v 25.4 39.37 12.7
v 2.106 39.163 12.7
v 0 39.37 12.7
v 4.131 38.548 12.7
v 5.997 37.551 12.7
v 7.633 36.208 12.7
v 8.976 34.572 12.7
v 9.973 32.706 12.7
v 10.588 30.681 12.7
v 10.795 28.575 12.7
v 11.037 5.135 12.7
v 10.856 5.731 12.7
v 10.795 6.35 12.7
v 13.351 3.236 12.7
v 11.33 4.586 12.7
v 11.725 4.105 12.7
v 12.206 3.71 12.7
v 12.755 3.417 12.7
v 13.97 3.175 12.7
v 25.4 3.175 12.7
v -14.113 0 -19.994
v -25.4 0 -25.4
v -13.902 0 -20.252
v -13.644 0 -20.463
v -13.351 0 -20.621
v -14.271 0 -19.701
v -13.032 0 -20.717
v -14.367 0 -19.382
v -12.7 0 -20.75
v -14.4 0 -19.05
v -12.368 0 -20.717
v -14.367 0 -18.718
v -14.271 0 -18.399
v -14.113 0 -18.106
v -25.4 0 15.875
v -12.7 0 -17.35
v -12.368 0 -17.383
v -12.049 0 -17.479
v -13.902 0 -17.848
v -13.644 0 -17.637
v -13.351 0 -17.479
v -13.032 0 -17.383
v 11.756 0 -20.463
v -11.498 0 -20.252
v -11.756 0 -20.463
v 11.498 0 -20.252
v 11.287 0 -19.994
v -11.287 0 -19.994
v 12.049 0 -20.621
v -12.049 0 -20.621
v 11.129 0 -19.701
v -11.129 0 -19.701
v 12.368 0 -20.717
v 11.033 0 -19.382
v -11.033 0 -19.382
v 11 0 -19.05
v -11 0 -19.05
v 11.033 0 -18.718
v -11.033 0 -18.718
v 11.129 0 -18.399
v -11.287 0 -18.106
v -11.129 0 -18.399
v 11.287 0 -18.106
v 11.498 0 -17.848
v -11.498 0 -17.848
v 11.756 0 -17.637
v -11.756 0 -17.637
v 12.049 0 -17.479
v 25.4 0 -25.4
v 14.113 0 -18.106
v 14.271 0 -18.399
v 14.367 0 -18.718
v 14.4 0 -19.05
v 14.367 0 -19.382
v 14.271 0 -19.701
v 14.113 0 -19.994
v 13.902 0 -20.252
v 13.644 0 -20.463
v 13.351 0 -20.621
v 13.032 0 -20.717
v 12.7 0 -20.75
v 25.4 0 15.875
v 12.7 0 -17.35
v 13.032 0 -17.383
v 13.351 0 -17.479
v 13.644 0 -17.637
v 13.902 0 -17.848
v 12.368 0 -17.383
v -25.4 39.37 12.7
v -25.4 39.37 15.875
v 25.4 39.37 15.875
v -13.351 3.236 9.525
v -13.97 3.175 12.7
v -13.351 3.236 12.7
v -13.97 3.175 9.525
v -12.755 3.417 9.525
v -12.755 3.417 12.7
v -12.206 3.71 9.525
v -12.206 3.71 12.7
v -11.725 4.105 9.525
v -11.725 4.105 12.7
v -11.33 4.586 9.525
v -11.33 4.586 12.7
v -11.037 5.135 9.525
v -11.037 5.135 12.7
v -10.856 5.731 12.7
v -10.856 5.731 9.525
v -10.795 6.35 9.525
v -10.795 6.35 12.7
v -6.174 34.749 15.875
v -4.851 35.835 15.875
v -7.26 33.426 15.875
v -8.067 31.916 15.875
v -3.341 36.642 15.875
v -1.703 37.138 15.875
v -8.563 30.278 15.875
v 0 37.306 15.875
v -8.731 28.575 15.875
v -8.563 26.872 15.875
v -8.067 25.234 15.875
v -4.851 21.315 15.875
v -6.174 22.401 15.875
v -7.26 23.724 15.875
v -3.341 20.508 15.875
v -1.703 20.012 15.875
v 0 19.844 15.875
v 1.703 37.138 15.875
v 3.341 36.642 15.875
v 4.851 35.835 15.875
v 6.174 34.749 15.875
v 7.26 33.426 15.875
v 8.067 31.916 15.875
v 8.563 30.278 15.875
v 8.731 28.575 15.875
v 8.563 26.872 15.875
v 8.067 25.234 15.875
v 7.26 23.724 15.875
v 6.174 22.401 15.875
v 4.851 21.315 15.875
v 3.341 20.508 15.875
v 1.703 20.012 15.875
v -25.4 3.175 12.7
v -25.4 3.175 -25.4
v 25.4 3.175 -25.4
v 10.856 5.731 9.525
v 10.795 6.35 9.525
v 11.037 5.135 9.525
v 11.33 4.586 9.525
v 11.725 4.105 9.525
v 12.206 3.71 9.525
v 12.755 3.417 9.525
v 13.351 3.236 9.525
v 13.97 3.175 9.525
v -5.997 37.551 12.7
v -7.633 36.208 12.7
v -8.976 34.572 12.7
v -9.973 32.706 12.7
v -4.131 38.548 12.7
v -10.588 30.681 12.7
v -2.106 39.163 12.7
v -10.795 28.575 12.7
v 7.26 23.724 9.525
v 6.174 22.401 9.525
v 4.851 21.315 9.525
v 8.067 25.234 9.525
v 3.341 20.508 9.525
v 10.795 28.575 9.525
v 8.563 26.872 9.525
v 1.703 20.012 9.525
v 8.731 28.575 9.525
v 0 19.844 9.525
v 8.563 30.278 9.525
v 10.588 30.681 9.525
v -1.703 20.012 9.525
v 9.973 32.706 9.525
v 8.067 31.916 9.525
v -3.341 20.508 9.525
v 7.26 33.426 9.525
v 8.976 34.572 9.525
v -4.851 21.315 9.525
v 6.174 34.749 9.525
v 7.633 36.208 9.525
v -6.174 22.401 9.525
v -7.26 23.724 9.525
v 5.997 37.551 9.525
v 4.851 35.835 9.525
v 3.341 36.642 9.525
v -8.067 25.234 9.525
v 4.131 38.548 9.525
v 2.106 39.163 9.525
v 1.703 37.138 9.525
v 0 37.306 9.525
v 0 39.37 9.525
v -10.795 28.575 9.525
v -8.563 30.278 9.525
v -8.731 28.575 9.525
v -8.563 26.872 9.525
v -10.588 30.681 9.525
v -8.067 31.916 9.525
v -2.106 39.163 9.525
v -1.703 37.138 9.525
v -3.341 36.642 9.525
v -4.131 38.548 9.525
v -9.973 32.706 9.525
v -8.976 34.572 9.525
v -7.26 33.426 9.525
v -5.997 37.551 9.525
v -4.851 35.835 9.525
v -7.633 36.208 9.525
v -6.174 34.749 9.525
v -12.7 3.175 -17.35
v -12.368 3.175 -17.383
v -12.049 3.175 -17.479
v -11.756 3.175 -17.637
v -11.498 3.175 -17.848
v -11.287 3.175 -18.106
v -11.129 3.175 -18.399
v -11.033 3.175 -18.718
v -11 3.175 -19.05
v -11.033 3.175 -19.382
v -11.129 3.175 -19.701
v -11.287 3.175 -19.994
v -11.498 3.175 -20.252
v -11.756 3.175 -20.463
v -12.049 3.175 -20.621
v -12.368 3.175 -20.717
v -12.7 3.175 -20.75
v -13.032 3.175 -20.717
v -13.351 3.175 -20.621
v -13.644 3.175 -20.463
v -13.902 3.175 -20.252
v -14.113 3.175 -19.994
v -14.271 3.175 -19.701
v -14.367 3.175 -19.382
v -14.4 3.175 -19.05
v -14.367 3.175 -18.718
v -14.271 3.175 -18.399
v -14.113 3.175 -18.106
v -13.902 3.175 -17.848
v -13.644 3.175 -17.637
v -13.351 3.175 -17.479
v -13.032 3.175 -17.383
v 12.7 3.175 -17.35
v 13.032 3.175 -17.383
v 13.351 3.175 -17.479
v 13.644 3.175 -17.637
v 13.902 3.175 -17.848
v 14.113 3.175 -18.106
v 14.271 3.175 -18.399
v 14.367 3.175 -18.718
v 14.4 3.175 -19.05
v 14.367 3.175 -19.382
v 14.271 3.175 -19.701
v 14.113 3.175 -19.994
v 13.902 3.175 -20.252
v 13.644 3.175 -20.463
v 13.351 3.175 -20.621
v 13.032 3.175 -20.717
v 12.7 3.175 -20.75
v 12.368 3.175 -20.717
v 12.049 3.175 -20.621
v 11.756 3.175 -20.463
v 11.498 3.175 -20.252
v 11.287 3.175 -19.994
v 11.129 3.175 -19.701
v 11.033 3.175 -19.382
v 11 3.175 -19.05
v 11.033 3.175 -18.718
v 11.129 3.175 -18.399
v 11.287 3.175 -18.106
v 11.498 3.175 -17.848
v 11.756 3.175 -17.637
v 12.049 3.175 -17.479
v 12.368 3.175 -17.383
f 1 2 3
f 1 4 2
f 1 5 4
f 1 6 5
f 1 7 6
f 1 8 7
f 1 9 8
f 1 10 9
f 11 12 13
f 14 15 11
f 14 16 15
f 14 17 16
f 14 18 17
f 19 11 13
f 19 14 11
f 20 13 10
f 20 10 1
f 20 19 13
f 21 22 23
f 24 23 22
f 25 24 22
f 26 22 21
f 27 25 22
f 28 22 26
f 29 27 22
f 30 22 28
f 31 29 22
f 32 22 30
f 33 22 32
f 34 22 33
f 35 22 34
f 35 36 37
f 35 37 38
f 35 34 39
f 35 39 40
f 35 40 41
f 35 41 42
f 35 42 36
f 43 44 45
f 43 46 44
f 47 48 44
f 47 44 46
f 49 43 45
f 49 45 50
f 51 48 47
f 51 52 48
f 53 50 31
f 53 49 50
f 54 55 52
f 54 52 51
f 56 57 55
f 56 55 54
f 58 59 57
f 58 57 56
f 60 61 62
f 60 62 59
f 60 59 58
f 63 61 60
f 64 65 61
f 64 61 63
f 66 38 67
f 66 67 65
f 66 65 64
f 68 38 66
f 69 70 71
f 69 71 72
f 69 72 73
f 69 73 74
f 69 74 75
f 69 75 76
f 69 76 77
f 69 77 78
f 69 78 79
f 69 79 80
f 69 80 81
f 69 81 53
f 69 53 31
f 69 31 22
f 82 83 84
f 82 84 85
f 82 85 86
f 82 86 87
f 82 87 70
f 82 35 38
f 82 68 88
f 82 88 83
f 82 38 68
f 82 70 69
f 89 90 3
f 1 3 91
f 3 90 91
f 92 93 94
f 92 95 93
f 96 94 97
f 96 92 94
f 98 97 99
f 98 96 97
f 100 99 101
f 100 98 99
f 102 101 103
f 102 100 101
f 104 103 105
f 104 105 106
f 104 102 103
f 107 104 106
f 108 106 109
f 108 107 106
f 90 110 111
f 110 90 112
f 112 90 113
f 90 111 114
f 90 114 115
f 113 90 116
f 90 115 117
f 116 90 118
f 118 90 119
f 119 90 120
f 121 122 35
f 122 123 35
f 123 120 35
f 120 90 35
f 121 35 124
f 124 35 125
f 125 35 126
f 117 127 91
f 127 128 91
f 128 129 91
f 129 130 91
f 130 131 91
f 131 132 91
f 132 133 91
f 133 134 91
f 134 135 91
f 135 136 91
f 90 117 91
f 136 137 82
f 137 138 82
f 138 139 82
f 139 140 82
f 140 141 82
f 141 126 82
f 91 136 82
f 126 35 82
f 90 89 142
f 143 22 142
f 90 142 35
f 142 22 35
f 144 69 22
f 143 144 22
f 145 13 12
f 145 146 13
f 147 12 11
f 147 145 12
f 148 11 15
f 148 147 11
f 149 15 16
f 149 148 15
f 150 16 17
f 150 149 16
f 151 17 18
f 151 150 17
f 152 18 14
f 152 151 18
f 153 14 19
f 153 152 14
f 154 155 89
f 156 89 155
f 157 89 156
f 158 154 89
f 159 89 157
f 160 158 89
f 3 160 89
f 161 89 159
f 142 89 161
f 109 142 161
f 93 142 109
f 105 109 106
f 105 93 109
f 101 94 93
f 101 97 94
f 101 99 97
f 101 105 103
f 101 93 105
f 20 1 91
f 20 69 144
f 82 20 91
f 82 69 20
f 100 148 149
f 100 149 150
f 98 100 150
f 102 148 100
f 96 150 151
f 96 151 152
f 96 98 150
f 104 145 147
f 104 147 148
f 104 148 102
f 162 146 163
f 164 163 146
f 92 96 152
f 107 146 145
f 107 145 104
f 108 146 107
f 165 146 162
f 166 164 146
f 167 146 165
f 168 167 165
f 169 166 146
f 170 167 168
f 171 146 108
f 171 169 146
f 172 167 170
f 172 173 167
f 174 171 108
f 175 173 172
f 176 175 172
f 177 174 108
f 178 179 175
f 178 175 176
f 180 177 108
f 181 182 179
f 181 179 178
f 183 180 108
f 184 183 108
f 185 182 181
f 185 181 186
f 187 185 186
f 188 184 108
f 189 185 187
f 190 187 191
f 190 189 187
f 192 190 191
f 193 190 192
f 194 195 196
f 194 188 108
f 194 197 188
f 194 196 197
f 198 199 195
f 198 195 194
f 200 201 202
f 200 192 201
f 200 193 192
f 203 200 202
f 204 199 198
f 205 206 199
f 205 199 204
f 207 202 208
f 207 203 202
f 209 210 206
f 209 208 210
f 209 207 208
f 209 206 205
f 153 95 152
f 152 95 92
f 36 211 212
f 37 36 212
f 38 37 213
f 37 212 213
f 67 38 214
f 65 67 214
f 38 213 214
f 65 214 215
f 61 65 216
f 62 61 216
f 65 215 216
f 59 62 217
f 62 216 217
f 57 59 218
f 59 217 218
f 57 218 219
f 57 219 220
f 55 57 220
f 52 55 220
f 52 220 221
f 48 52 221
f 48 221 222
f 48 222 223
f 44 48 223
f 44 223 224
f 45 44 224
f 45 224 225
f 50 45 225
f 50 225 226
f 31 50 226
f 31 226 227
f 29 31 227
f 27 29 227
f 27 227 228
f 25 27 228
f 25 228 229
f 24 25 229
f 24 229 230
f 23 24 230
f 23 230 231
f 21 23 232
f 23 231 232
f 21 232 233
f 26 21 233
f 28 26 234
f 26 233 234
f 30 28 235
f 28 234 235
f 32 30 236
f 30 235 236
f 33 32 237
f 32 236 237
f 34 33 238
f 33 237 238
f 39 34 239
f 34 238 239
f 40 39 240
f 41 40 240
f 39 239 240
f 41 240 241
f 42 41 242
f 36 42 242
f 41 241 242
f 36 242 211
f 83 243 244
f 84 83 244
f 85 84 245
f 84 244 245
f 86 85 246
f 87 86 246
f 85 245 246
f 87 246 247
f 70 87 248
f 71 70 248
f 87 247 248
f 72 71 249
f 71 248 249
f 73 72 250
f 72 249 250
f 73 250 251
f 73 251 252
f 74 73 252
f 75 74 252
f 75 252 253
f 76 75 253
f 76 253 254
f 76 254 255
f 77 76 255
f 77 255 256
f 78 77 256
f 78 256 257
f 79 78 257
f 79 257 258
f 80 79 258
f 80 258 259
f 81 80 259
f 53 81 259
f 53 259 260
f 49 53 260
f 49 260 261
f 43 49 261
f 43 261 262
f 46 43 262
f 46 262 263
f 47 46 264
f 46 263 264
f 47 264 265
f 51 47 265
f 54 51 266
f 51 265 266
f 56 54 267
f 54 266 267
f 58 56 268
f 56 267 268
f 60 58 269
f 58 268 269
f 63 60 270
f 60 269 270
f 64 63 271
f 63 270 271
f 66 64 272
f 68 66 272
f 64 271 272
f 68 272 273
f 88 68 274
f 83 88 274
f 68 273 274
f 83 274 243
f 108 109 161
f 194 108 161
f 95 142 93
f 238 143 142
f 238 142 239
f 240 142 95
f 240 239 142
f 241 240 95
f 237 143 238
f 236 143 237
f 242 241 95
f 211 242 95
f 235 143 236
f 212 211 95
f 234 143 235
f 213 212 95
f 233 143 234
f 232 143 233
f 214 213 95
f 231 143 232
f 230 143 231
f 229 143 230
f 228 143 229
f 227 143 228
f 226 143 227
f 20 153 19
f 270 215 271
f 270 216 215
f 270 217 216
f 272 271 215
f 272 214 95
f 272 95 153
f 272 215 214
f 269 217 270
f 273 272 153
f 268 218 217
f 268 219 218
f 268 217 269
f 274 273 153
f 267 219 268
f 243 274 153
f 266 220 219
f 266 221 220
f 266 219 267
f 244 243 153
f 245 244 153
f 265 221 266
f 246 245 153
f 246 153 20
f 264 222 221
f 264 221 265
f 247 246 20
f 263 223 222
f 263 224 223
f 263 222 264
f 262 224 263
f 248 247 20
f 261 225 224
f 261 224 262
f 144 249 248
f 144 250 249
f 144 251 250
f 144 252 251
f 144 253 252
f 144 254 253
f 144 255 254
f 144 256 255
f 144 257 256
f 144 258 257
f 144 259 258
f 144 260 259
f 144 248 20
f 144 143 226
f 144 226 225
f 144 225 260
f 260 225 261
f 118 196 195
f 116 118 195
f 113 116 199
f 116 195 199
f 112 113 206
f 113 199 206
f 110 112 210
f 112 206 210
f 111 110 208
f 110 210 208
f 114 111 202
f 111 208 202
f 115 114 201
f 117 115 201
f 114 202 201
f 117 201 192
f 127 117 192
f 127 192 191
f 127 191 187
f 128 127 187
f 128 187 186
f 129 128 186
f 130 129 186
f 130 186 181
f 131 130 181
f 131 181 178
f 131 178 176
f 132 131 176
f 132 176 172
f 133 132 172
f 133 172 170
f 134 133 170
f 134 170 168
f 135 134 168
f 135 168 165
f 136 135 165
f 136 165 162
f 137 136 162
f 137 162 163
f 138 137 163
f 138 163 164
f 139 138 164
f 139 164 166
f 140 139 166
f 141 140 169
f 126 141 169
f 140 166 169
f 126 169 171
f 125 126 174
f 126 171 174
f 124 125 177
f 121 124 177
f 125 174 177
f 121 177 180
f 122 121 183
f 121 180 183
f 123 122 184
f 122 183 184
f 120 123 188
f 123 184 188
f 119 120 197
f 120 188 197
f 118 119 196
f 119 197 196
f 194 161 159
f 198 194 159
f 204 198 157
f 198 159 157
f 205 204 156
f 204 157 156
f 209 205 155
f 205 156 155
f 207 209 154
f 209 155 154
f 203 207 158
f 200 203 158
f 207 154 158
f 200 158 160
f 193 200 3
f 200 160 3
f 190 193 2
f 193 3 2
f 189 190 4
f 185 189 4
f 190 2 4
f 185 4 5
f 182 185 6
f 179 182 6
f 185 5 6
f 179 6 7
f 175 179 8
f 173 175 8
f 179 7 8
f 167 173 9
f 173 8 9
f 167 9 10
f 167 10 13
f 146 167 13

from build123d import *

# Parameters (mm, degrees)
BOSS_EXTRUDE1_DEPTH  = 3.175
M3_CLEARANCE_HOLE1_D = 3.4
SKETCH7_W            = 50.8
SKETCH7_H            = 3.175
BOSS_EXTRUDE3_DEPTH  = 39.37
BOSS_EXTRUDE4_DEPTH  = 3.175
SKETCH9_R            = 8.73125
CUT_EXTRUDE1_DEPTH   = 7.35
FILLET1_R            = 3.175


with BuildPart() as part:
    # Sketch2 → Boss-Extrude1 (new body)
    with BuildSketch(Plane(origin=(0, 0, 0), x_dir=(1, 0, 0), z_dir=(0, 1, 0))):
        Polygon((-25.4, -12.7), (25.4, -12.7), (25.4, 12.7), (25.4, 25.4), (-25.4, 25.4), (-25.4, 12.7), align=None)
    extrude(amount=BOSS_EXTRUDE1_DEPTH)

    # M3 Clearance Hole1 (through all)
    with Locations(Plane(origin=(-12.7, 0, -19.05), x_dir=(0, 0, -1), z_dir=(0, -1, 0))):
        with Locations((0, 0), (0, 25.4)):
            Hole(M3_CLEARANCE_HOLE1_D / 2)

    # Sketch7 → Boss-Extrude3 (add)
    with BuildSketch(Plane.XZ):
        with Locations((0, 14.2875)):
            Rectangle(SKETCH7_W, SKETCH7_H)
    extrude(amount=-BOSS_EXTRUDE3_DEPTH)

    # Sketch8 → Boss-Extrude4 (add)
    with BuildSketch(Plane(origin=(0, 0, 12.7), x_dir=(-1, 0, 0), z_dir=(0, 0, -1))):
        with BuildLine():
            Line((-10.795, 28.575), (-10.795, 3.175))
            Line((-10.795, 3.175), (10.795, 3.175))
            Line((10.795, 3.175), (10.795, 28.575))
            ThreePointArc((10.795, 28.575), (0, 39.37), (-10.795, 28.575))
        make_face()
    extrude(amount=BOSS_EXTRUDE4_DEPTH)

    # Sketch9 → Cut-Extrude1 (cut, through all)
    with BuildSketch(Plane(origin=(0, 0, 9.525), x_dir=(-1, 0, 0), z_dir=(0, 0, -1))):
        with Locations((0, 28.575)):
            Circle(SKETCH9_R)
    extrude(amount=-CUT_EXTRUDE1_DEPTH, mode=Mode.SUBTRACT)

    # Fillet1
    fillet1_edges = [part.edges().sort_by_distance(p)[0] for p in [
        (10.795, 3.175, 11.1125),
        (-10.795, 3.175, 11.1125),
    ]]
    fillet(fillet1_edges, radius=FILLET1_R)


solid = part.part
